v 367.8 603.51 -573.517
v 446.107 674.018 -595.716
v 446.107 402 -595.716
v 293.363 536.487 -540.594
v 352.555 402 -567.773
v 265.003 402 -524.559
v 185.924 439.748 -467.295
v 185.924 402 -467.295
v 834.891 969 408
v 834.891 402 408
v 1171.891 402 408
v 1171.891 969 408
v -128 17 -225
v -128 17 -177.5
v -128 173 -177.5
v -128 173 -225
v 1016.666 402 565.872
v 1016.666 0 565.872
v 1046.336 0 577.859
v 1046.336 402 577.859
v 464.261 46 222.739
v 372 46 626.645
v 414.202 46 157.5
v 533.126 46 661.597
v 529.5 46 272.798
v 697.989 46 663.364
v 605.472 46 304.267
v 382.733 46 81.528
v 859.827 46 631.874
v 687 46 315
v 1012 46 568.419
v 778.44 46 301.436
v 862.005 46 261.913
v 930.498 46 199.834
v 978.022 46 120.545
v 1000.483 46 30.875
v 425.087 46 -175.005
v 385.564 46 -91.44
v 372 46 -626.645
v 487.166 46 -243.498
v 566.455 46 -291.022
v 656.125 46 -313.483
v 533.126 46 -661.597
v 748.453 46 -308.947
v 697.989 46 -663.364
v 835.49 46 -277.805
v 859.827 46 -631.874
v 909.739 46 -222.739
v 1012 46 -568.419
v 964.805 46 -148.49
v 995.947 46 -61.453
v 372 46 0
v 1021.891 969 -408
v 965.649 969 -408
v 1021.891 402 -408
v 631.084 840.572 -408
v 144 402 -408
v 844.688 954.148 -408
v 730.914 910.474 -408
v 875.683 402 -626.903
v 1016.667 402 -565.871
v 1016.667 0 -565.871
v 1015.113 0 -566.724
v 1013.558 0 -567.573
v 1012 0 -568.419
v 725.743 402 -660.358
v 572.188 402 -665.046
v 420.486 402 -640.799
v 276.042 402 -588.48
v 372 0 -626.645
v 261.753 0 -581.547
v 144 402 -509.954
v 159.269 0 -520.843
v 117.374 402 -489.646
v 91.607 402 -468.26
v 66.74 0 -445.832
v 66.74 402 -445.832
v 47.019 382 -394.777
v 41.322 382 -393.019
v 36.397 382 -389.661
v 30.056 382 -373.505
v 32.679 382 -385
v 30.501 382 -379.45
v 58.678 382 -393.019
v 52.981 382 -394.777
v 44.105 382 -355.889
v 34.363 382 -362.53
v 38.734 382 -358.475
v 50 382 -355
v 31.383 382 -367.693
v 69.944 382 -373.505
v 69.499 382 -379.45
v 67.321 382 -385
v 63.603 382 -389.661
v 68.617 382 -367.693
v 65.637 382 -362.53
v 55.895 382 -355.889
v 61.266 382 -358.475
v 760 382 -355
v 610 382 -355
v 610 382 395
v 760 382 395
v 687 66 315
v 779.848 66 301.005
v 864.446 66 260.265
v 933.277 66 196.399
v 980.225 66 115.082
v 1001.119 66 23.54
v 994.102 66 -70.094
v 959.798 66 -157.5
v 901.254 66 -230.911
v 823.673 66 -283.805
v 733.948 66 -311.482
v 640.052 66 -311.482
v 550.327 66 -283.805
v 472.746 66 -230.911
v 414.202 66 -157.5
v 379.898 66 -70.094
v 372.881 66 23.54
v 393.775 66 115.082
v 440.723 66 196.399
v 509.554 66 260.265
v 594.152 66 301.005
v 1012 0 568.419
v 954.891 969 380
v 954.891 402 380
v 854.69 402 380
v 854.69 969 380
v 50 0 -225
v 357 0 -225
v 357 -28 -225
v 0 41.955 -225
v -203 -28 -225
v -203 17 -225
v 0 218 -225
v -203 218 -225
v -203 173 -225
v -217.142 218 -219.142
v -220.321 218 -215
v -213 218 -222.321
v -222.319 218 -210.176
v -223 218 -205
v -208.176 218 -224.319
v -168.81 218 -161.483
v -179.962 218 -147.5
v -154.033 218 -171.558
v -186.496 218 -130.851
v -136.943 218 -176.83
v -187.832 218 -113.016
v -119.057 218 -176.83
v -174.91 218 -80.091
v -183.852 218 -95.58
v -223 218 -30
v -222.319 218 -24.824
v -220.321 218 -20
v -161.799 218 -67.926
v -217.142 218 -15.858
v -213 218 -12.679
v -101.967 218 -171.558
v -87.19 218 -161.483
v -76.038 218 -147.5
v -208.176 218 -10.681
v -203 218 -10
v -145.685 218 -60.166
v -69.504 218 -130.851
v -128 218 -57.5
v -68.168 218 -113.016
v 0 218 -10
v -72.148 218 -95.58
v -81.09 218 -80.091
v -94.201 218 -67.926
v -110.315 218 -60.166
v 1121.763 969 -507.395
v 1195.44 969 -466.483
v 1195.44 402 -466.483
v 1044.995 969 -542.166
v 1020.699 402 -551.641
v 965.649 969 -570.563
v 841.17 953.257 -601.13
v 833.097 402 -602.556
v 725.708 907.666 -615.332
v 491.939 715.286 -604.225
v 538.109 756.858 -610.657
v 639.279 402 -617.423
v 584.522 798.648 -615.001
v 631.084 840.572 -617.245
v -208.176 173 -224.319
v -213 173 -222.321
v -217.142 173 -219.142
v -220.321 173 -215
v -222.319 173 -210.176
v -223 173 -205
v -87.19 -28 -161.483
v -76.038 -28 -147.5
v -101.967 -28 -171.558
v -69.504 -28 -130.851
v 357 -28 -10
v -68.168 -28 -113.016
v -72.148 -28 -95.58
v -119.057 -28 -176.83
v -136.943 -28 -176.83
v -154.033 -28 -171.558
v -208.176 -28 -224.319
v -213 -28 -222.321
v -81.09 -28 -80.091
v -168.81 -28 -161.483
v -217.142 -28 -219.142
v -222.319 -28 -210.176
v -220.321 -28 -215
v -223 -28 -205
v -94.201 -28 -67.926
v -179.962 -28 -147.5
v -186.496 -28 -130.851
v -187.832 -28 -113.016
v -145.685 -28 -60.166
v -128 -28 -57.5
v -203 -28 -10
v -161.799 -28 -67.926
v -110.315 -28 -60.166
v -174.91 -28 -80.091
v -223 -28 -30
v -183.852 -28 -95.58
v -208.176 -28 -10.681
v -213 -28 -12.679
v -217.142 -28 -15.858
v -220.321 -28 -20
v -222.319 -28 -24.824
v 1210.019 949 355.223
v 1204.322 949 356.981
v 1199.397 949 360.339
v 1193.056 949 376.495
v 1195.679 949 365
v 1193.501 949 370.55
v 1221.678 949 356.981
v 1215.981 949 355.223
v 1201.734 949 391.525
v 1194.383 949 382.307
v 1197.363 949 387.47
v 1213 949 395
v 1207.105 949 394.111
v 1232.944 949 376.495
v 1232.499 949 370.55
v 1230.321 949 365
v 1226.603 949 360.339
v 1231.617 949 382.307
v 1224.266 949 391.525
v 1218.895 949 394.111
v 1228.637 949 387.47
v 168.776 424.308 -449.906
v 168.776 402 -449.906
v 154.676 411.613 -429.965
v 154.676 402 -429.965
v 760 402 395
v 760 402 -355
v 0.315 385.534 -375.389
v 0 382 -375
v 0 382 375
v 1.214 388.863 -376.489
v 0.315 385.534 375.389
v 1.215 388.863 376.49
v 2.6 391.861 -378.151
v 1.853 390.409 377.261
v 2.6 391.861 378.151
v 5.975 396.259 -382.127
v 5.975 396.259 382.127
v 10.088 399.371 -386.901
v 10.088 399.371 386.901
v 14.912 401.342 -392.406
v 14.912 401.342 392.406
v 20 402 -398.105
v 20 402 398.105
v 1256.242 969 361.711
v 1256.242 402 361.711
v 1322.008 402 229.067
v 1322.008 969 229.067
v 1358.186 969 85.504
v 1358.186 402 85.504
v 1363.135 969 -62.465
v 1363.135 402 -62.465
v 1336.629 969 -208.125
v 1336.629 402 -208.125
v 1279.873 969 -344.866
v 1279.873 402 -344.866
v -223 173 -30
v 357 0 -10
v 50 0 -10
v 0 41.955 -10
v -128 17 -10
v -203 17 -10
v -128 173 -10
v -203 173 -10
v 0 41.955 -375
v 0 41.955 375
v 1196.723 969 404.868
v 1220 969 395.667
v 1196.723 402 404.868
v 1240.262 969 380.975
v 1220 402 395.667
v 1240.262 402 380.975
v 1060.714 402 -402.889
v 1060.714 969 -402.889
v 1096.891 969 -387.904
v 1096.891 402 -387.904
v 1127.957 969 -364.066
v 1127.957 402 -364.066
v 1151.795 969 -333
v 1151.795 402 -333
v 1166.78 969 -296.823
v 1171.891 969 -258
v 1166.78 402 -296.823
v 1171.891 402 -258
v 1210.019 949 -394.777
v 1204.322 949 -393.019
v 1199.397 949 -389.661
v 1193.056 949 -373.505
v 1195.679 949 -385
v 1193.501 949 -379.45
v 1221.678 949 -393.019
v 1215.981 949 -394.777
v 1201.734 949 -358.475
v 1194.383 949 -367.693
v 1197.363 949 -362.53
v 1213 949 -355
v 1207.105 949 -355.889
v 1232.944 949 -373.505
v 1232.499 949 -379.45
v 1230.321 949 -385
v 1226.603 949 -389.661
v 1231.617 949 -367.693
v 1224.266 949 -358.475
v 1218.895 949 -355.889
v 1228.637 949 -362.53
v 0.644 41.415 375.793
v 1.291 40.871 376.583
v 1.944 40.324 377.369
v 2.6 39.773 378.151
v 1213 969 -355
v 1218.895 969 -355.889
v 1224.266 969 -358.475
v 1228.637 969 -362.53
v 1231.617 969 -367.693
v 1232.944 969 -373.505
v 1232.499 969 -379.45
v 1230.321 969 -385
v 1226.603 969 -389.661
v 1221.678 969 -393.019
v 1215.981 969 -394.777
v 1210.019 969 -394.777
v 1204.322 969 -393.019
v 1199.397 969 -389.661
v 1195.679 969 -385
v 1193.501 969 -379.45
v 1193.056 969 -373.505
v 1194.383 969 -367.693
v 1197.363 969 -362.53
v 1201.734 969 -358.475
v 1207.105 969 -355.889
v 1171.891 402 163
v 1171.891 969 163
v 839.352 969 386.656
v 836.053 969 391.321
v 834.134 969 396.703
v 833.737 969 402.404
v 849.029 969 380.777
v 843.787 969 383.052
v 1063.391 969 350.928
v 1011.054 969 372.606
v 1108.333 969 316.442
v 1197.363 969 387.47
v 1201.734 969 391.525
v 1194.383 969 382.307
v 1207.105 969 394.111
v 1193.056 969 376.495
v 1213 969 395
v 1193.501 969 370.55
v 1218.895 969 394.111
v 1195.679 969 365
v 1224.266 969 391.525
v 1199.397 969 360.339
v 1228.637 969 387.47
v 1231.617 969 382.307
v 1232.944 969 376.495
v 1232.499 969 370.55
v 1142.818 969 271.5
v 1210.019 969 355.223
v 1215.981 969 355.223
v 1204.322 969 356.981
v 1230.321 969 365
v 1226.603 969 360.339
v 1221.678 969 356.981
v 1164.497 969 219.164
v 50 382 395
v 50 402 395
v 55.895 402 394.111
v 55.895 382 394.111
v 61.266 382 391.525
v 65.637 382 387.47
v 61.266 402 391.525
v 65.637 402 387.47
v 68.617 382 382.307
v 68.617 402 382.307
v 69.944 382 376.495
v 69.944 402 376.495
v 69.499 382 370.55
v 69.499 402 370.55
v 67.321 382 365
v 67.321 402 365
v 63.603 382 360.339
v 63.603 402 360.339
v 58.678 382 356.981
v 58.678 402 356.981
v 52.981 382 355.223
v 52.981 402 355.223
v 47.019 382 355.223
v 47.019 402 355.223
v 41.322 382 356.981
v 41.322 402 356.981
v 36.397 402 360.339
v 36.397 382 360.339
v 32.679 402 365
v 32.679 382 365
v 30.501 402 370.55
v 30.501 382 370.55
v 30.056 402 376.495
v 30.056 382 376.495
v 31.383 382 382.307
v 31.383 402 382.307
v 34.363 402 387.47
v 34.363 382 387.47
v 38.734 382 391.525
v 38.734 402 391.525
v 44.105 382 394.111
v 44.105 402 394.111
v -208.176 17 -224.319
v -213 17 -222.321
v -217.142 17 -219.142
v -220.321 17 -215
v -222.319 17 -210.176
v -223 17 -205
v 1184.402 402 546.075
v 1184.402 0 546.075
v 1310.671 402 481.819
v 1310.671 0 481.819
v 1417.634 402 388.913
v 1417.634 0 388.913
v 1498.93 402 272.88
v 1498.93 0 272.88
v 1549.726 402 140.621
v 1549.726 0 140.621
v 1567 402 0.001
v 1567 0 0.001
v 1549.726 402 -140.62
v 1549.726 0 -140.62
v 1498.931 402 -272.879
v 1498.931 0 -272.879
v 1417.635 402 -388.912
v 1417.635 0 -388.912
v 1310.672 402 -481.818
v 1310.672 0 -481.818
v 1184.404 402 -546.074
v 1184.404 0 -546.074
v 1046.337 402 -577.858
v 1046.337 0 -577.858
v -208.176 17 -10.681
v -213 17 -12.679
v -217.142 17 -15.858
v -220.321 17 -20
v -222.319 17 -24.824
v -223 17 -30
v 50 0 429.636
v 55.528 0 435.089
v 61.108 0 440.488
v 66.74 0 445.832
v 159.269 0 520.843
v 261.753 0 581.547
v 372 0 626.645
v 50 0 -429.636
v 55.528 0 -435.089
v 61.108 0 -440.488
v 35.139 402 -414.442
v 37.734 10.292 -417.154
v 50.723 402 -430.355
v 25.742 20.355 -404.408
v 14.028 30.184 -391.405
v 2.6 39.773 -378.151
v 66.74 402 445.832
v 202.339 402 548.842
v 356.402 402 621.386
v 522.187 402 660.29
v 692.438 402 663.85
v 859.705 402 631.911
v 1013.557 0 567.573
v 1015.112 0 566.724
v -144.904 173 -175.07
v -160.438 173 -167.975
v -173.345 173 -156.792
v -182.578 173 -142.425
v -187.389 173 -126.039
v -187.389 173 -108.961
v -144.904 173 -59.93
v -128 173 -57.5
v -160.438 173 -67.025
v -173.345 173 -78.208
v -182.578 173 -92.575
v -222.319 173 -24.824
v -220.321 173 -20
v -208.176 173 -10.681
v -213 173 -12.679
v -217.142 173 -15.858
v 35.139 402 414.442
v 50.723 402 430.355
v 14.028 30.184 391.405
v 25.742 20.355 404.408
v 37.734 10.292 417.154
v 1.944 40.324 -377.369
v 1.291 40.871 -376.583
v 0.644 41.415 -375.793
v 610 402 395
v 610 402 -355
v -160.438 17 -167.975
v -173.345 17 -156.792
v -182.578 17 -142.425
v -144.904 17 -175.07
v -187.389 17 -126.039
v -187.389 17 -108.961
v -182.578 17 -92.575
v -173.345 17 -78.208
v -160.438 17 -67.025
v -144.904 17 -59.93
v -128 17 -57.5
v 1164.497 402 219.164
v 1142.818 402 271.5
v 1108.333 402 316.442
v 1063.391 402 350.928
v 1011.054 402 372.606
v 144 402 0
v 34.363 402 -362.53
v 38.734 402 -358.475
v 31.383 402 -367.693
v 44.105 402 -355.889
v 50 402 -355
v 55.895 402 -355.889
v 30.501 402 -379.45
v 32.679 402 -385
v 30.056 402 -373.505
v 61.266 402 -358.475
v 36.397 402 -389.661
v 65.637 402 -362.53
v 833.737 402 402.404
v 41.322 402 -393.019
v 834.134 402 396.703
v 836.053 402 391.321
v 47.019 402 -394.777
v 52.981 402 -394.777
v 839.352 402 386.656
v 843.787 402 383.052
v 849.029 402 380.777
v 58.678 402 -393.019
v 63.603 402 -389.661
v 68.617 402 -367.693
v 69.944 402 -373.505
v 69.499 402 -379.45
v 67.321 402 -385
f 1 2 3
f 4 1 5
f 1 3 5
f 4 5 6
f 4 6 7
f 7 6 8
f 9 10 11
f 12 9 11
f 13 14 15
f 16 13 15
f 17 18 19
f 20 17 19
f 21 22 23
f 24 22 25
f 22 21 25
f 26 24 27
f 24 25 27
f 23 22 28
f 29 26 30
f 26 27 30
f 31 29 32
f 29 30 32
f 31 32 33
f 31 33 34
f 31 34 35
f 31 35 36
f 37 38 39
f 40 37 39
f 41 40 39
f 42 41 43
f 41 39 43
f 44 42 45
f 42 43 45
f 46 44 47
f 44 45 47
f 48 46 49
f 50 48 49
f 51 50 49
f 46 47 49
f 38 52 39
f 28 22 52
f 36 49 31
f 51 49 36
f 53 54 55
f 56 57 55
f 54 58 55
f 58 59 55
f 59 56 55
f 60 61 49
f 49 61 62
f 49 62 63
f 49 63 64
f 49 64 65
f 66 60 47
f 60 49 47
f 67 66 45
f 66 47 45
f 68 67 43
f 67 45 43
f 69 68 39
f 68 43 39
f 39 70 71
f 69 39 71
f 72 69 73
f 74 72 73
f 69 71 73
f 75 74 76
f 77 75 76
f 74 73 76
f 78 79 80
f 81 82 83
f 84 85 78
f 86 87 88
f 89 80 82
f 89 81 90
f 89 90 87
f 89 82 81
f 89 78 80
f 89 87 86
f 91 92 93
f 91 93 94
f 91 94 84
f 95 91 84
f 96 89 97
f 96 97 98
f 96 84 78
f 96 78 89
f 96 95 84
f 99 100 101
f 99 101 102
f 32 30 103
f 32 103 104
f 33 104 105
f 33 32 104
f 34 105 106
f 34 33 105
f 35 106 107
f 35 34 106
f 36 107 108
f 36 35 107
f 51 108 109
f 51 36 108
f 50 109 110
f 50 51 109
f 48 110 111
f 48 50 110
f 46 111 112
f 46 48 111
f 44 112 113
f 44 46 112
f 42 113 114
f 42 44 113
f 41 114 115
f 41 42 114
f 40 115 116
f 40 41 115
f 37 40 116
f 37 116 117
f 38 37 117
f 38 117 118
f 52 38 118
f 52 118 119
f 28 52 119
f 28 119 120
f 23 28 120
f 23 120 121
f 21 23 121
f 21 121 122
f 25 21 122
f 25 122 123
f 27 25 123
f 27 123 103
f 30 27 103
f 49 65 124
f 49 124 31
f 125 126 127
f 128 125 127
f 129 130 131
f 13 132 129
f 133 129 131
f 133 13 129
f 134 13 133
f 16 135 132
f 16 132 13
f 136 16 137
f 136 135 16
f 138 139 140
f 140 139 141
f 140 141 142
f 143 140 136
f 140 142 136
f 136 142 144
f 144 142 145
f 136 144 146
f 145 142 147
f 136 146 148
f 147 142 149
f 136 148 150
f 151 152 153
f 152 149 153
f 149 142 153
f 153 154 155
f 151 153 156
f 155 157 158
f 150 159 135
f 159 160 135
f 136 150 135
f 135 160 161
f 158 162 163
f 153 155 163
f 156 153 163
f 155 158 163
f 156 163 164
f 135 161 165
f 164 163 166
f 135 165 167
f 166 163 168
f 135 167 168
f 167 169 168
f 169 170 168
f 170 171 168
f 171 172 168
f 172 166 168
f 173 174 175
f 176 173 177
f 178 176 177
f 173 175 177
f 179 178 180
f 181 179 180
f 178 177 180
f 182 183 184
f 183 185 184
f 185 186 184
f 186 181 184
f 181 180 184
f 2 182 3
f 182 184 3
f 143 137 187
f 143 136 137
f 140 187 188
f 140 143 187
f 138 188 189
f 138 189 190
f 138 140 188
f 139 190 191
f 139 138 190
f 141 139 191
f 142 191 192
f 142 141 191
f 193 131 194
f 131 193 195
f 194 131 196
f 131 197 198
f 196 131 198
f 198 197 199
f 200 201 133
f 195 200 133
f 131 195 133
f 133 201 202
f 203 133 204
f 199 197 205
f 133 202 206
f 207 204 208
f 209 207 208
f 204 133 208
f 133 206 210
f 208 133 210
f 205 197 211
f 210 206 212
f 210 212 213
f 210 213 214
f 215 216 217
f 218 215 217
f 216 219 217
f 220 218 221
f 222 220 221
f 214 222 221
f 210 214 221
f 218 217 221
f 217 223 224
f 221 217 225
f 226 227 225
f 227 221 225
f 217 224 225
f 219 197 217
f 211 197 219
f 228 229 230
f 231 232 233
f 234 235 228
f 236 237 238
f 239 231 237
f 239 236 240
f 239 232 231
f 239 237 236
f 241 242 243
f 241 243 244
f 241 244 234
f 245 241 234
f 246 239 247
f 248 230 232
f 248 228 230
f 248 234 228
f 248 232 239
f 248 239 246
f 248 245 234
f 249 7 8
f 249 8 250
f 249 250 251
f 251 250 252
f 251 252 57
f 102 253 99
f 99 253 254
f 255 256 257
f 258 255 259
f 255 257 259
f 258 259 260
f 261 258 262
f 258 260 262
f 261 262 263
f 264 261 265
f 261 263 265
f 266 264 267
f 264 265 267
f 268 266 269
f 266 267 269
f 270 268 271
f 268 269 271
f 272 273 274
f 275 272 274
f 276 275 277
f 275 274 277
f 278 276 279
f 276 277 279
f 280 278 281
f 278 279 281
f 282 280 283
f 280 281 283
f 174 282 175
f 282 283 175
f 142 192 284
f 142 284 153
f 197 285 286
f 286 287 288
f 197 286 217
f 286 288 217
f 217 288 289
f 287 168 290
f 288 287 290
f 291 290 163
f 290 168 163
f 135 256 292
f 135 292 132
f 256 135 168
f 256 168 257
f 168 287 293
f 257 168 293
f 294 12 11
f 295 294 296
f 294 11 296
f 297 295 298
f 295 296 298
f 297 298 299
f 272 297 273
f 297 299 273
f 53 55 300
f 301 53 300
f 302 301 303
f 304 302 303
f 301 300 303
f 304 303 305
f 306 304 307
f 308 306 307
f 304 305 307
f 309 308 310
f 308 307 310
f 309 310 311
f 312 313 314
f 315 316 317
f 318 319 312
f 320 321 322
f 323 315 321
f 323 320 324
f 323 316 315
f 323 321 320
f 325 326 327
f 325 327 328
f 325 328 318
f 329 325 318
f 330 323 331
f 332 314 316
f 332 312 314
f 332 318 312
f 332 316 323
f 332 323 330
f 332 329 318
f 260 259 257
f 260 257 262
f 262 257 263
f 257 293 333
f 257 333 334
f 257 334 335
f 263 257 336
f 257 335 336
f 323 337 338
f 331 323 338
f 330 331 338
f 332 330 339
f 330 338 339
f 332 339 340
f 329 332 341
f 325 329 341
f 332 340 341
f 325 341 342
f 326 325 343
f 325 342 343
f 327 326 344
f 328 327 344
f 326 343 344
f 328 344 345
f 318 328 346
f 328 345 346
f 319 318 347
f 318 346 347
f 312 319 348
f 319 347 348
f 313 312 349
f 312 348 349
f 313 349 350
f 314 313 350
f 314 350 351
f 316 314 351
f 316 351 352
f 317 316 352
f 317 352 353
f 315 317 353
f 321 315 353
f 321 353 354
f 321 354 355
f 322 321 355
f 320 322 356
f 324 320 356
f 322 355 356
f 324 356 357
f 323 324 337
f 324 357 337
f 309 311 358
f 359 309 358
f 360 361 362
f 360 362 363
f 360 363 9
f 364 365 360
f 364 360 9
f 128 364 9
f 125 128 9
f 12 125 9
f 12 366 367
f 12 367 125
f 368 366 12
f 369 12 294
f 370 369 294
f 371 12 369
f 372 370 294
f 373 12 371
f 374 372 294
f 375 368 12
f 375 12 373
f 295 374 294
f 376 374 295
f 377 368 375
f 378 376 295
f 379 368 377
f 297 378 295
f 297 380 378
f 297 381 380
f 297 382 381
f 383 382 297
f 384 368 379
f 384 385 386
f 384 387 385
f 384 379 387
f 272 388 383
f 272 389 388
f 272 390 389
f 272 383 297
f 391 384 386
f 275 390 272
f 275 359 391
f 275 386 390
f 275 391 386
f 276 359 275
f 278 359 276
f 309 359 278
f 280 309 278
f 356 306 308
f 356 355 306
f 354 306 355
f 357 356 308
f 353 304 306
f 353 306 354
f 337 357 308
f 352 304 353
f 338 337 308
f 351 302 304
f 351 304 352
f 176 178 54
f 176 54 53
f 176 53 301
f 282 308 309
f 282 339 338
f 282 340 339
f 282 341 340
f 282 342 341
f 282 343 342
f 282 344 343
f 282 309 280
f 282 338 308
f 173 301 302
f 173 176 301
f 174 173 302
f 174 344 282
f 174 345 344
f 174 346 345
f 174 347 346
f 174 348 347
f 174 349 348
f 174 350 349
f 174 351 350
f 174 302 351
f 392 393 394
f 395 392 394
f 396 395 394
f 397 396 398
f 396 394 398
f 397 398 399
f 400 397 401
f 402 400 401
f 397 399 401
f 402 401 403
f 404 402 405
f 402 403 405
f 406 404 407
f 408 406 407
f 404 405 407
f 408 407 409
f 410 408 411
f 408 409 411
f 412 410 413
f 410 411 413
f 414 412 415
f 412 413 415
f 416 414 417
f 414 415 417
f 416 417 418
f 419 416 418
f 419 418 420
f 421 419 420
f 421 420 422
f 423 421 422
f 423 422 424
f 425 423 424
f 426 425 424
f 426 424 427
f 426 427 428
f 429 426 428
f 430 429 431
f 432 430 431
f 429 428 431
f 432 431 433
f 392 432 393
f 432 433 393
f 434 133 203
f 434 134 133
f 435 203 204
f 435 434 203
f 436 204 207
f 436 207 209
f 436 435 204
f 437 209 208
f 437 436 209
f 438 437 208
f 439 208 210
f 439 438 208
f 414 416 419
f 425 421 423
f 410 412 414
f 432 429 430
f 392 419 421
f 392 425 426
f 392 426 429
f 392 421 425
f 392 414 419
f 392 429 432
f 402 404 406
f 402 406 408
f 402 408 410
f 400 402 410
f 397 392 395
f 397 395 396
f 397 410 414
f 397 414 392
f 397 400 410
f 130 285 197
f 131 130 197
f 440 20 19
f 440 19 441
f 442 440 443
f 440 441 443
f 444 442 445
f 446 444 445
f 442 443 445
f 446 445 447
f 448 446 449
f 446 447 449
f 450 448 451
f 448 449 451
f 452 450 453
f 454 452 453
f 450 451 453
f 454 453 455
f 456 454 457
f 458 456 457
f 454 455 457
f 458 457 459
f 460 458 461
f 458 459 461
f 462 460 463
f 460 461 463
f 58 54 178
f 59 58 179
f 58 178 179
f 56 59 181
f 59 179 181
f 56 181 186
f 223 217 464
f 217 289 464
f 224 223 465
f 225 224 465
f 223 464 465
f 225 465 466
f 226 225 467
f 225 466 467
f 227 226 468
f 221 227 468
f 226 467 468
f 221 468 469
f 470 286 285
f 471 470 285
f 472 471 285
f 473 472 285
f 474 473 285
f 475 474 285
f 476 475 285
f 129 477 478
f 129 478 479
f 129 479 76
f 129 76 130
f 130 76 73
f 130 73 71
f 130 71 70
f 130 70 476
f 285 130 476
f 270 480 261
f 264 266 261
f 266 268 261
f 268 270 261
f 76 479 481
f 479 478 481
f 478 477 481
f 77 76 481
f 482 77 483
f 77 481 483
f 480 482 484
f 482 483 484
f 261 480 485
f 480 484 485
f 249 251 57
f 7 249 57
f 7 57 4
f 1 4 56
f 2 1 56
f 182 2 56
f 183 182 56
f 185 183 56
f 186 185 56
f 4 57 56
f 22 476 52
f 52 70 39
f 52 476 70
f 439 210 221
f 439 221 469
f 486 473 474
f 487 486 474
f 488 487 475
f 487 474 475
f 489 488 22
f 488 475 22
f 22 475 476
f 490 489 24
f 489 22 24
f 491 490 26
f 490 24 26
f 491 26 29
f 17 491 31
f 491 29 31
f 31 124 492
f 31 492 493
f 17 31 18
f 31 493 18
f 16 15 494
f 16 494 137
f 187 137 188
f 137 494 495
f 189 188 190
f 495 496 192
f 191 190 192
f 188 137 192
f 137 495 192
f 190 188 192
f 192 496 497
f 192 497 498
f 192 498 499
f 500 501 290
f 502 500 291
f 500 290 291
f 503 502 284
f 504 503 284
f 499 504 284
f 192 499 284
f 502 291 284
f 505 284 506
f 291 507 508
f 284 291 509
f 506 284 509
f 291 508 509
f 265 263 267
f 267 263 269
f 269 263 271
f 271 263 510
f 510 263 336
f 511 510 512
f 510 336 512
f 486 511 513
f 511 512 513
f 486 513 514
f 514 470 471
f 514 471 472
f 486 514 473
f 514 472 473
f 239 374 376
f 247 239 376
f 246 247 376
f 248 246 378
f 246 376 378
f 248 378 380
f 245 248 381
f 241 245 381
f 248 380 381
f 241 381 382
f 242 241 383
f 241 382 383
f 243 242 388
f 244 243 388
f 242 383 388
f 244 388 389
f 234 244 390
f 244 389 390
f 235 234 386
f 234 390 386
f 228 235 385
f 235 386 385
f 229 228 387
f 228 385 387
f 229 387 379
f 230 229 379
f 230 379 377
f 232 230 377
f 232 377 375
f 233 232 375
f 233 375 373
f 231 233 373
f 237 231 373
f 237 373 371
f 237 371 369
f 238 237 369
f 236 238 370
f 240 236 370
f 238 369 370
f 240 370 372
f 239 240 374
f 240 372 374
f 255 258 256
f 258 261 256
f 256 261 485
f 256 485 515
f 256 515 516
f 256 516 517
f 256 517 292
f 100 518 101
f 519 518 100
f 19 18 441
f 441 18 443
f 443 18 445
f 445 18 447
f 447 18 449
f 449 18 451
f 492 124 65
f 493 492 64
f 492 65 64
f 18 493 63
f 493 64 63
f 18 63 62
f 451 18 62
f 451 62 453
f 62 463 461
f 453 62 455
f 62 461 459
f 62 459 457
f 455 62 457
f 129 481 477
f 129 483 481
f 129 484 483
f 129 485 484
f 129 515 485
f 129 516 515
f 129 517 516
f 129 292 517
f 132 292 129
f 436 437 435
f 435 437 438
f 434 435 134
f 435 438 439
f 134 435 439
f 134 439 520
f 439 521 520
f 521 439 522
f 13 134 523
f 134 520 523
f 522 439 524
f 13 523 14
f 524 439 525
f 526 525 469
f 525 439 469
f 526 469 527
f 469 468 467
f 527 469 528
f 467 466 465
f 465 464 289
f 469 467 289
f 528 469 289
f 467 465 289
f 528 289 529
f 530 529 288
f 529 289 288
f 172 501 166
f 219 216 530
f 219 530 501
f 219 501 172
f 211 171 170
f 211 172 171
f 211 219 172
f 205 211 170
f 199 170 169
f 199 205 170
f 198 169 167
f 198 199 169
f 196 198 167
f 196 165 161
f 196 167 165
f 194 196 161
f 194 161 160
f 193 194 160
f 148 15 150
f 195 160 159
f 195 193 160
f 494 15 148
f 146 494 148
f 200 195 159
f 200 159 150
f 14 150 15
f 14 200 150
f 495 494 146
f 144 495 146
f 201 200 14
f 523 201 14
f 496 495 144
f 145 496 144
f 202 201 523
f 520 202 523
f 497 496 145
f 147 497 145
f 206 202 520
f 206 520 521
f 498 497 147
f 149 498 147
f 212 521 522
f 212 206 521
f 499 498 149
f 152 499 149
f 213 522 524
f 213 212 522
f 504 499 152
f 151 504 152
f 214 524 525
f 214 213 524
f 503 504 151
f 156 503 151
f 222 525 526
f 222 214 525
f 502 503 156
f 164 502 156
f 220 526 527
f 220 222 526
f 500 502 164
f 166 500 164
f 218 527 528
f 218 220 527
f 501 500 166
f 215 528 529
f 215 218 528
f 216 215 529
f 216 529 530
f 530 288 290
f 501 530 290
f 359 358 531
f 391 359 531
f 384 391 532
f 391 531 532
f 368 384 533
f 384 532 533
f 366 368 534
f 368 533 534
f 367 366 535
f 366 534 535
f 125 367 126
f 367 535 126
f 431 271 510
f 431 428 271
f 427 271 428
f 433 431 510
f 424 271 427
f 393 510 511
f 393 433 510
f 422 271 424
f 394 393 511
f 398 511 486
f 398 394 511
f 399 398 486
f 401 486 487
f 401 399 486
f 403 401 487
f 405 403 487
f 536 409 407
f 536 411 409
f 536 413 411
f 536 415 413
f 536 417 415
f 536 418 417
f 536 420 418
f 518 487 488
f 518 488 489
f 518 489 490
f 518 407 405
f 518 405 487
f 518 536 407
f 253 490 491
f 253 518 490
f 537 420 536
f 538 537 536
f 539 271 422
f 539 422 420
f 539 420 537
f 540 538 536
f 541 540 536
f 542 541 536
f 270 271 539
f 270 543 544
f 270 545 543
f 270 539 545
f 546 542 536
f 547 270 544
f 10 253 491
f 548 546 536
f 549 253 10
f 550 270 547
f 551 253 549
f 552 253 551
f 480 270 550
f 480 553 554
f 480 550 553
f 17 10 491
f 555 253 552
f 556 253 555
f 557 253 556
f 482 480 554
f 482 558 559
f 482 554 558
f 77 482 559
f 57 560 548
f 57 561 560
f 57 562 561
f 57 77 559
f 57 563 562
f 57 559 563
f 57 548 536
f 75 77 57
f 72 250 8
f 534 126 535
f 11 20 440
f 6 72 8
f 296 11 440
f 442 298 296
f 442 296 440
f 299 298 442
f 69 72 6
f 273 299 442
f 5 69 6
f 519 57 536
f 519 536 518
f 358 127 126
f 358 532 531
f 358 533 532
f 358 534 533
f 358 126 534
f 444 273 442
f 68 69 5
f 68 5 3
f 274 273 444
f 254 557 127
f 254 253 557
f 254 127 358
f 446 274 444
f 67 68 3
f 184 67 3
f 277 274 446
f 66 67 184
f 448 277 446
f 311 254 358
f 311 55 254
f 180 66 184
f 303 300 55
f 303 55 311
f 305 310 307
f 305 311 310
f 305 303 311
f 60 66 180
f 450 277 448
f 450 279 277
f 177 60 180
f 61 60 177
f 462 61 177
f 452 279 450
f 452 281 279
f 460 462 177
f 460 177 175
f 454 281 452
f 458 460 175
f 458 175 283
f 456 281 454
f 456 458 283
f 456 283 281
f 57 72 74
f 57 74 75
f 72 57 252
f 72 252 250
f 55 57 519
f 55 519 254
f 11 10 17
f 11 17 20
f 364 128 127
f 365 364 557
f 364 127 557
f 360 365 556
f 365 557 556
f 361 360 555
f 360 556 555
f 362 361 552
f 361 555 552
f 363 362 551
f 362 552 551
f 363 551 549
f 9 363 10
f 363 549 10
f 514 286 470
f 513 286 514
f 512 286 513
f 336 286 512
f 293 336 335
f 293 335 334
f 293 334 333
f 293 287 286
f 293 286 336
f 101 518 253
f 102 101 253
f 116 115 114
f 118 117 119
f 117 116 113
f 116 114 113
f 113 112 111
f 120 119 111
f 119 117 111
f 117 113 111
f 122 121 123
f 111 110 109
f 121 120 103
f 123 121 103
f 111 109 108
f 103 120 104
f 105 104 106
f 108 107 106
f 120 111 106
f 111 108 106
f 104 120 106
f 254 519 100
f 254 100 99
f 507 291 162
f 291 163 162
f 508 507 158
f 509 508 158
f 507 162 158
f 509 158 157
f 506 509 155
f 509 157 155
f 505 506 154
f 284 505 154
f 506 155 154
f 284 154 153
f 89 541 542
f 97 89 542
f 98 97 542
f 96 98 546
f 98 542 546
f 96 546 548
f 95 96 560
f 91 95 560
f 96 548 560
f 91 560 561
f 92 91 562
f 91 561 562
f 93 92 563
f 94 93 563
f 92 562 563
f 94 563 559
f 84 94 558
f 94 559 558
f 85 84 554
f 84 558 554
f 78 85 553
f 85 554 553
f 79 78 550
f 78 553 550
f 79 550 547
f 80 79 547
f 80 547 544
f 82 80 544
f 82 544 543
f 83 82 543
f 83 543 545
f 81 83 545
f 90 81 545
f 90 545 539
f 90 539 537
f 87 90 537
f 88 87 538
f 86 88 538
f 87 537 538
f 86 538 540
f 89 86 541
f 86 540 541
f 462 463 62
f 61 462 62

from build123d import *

# Parameters (mm, degrees)
BOSS_EXTRUDE1_DEPTH     = 402
BOSS_EXTRUDE2_DEPTH     = 969
CUT_EXTRUDE1_DEPTH      = 1960.325116763
FILLET1_R               = 500
CUT_EXTRUDE2_START      = 402
SKETCH4_W               = 150
SKETCH4_H               = 750
CUT_EXTRUDE2_DEPTH      = 20
SKETCH7_R               = 20
CUT_EXTRUDE3_DEPTH      = 20
SKETCH8_R               = 20
CUT_EXTRUDE4_DEPTH      = 20
BOSS_EXTRUDE3_START     = -10
BOSS_EXTRUDE3_DEPTH     = 215
FILLET2_R               = 20
CUT_EXTRUDE5_DEPTH      = 226
CUT_EXTRUDE5_DEPTH_BACK = 1960.325116812
SKETCH10_R              = 60
CHAMFER1_SIZE           = 50
CHAMFER1_SIZE2          = 41.954981559
FILLET3_R               = 20
SKETCH11_R              = 315
CUT_EXTRUDE6_DEPTH      = 66
CUT_EXTRUDE7_DEPTH      = 1960.325116812
CUT_EXTRUDE7_DEPTH_BACK = 1960.325116812
SKETCH12_W              = 640
SKETCH12_H              = 46


with BuildPart() as part:
    # Sketch1 → Boss-Extrude1 (new body)
    with BuildSketch(Plane(origin=(0, 0, 0), x_dir=(1, 0, 0), z_dir=(0, 1, 0))):
        with BuildLine():
            Line((1046.337061031, 577.858493981), (1016.667317849, 565.870736079))
            ThreePointArc((1016.667317849, 565.870736079), (522.188011035, 660.289732015), (66.74007867, 445.832480877))
            ThreePointArc((66.74007867, 445.832480877), (33.691690874, 412.919114907), (2.599998001, 378.151425458))
            ThreePointArc((2.599998001, 378.151425458), (1.291392319, 376.582813438), (0, 375))
            Line((0, 375), (0, -375))
            ThreePointArc((0, -375), (1.291392319, -376.582813438), (2.599998001, -378.151425458))
            ThreePointArc((2.599998001, -378.151425458), (33.691690874, -412.919114907), (66.74007867, -445.832480877))
            ThreePointArc((66.74007867, -445.832480877), (522.187167102, -660.28962537), (1016.665827322, -565.871556268))
            Line((1016.665827322, -565.871556268), (1046.335850828, -577.858620343))
            ThreePointArc((1046.335850828, -577.858620343), (1567, -0.000608391), (1046.337061031, 577.858493981))
        make_face()
    extrude(amount=BOSS_EXTRUDE1_DEPTH)

    # Sketch2 → Boss-Extrude2 (add)
    with BuildSketch(Plane(origin=(0, 0, 0), x_dir=(1, 0, 0), z_dir=(0, 1, 0))):
        with BuildLine():
            Line((144, 408), (1021.890739397, 408))
            ThreePointArc((1021.890739397, 408), (1127.956756575, 364.066017178), (1171.890739397, 258))
            Line((1171.890739397, 258), (1171.890739397, -163))
            ThreePointArc((1171.890739397, -163), (1108.332910914, -316.442171517), (954.890739397, -380))
            Line((954.890739397, -380), (854.68972927, -380))
            ThreePointArc((854.68972927, -380), (837.543301071, -388.875644347), (834.890739397, -408))
            Line((834.890739397, -408), (1171.890739397, -408))
            ThreePointArc((1171.890739397, -408), (1219.999604094, -395.667195333), (1256.24212417, -361.710742752))
            ThreePointArc((1256.24212417, -361.710742752), (1363.13459057, 62.465453501), (1195.440223215, 466.482834313))
            ThreePointArc((1195.440223215, 466.482834313), (833.097116799, 602.555696564), (446.106721665, 595.715763658))
            ThreePointArc((446.106721665, 595.715763658), (307.869625647, 548.008401888), (185.923871205, 467.294586118))
            ThreePointArc((185.923871205, 467.294586118), (161.31953374, 440.222630818), (144, 408))
        make_face()
    extrude(amount=BOSS_EXTRUDE2_DEPTH)

    # Sketch3 → Cut-Extrude1 (cut, through all)
    with BuildSketch(Plane.XY):
        Polygon((144, 402), (773.717295908, 969), (144, 969), align=None)
    extrude(amount=-CUT_EXTRUDE1_DEPTH, mode=Mode.SUBTRACT)

    # Fillet1
    fillet1_edges = [part.edges().sort_by_distance(p)[0] for p in [
        (773.717295908, 969, -509.514721406),
    ]]
    fillet(fillet1_edges, radius=FILLET1_R)

    # Sketch4 → Cut-Extrude2 (cut)
    with BuildSketch(Plane(origin=(0, 0, 0), x_dir=(1, 0, 0), z_dir=(0, 1, 0)).offset(CUT_EXTRUDE2_START)):
        with Locations((685, -20)):
            Rectangle(SKETCH4_W, SKETCH4_H)
    extrude(amount=-CUT_EXTRUDE2_DEPTH, mode=Mode.SUBTRACT)

    # Sketch7 → Cut-Extrude3 (cut)
    with BuildSketch(Plane(origin=(0, 402, 0), x_dir=(1, 0, 0), z_dir=(0, 1, 0))):
        with Locations(Location((50, 375, 0), (0, 0, 270))):
            Circle(SKETCH7_R)
        with Locations(Location((50, -375, 0), (0, 0, 270))):
            Circle(SKETCH7_R)
    extrude(amount=-CUT_EXTRUDE3_DEPTH, mode=Mode.SUBTRACT)

    # Sketch8 → Cut-Extrude4 (cut)
    with BuildSketch(Plane(origin=(0, 969, 0), x_dir=(1, 0, 0), z_dir=(0, 1, 0))):
        with Locations(Location((1213, 375, 0), (0, 0, 270))):
            Circle(SKETCH8_R)
        with Locations(Location((1213, -375, 0), (0, 0, 270))):
            Circle(SKETCH8_R)
    extrude(amount=-CUT_EXTRUDE4_DEPTH, mode=Mode.SUBTRACT)

    # Sketch9 → Boss-Extrude3 (add)
    with BuildSketch(Plane.XY.offset(BOSS_EXTRUDE3_START)):
        Polygon((0, 0), (357, 0), (357, -28), (-223, -28), (-223, 17), (-128, 17), (-128, 173), (-223, 173), (-223, 218), (0, 218), align=None)
    extrude(amount=-BOSS_EXTRUDE3_DEPTH)

    # Fillet2
    fillet2_edges = [part.edges().sort_by_distance(p)[0] for p in [
        (-223, -5.5, -10),
        (-223, 195.5, -10),
        (-223, -5.5, -225),
        (-223, 195.5, -225),
    ]]
    fillet(fillet2_edges, radius=FILLET2_R)

    # Sketch10 → Cut-Extrude5 (cut, two sides: drawn at the far end of the back side and taken through both)
    with BuildSketch(Plane(origin=(0, 0, 0), x_dir=(1, 0, 0), z_dir=(0, 1, 0)).offset(-CUT_EXTRUDE5_DEPTH_BACK)):
        with Locations(Location((-128, 117.5, 0), (0, 0, 270))):
            Circle(SKETCH10_R)
    extrude(amount=CUT_EXTRUDE5_DEPTH + CUT_EXTRUDE5_DEPTH_BACK, mode=Mode.SUBTRACT)

    # Chamfer1
    chamfer1_edges = [part.edges().sort_by_distance(p)[0] for p in [
        (0, 0, -300),
        (0, 0, 182.5),
    ]]
    chamfer1_side = [part.faces().sort_by_distance(p)[0] for p in [
        (765.492068196, 0, 5.511575813),
    ]]
    chamfer(chamfer1_edges, length=CHAMFER1_SIZE, length2=CHAMFER1_SIZE2, reference=chamfer1_side[0])

    # Fillet3
    fillet3_edges = [part.edges().sort_by_distance(p)[0] for p in [
        (0, 402, 0),
    ]]
    fillet(fillet3_edges, radius=FILLET3_R)

    # Sketch11 → Cut-Extrude6 (cut)
    with BuildSketch(Plane(origin=(0, 0, 0), x_dir=(1, 0, 0), z_dir=(0, 1, 0))):
        with Locations(Location((687, 0, 0), (0, 0, 270))):
            Circle(SKETCH11_R)
    extrude(amount=CUT_EXTRUDE6_DEPTH, mode=Mode.SUBTRACT)

    # Sketch12 → Cut-Extrude7 (cut, two sides: drawn at the far end of the back side and taken through both)
    with BuildSketch(Plane.XY.offset(-CUT_EXTRUDE7_DEPTH_BACK)):
        with Locations((692, 23)):
            Rectangle(SKETCH12_W, SKETCH12_H)
    extrude(amount=CUT_EXTRUDE7_DEPTH + CUT_EXTRUDE7_DEPTH_BACK, mode=Mode.SUBTRACT)


solid = part.part
